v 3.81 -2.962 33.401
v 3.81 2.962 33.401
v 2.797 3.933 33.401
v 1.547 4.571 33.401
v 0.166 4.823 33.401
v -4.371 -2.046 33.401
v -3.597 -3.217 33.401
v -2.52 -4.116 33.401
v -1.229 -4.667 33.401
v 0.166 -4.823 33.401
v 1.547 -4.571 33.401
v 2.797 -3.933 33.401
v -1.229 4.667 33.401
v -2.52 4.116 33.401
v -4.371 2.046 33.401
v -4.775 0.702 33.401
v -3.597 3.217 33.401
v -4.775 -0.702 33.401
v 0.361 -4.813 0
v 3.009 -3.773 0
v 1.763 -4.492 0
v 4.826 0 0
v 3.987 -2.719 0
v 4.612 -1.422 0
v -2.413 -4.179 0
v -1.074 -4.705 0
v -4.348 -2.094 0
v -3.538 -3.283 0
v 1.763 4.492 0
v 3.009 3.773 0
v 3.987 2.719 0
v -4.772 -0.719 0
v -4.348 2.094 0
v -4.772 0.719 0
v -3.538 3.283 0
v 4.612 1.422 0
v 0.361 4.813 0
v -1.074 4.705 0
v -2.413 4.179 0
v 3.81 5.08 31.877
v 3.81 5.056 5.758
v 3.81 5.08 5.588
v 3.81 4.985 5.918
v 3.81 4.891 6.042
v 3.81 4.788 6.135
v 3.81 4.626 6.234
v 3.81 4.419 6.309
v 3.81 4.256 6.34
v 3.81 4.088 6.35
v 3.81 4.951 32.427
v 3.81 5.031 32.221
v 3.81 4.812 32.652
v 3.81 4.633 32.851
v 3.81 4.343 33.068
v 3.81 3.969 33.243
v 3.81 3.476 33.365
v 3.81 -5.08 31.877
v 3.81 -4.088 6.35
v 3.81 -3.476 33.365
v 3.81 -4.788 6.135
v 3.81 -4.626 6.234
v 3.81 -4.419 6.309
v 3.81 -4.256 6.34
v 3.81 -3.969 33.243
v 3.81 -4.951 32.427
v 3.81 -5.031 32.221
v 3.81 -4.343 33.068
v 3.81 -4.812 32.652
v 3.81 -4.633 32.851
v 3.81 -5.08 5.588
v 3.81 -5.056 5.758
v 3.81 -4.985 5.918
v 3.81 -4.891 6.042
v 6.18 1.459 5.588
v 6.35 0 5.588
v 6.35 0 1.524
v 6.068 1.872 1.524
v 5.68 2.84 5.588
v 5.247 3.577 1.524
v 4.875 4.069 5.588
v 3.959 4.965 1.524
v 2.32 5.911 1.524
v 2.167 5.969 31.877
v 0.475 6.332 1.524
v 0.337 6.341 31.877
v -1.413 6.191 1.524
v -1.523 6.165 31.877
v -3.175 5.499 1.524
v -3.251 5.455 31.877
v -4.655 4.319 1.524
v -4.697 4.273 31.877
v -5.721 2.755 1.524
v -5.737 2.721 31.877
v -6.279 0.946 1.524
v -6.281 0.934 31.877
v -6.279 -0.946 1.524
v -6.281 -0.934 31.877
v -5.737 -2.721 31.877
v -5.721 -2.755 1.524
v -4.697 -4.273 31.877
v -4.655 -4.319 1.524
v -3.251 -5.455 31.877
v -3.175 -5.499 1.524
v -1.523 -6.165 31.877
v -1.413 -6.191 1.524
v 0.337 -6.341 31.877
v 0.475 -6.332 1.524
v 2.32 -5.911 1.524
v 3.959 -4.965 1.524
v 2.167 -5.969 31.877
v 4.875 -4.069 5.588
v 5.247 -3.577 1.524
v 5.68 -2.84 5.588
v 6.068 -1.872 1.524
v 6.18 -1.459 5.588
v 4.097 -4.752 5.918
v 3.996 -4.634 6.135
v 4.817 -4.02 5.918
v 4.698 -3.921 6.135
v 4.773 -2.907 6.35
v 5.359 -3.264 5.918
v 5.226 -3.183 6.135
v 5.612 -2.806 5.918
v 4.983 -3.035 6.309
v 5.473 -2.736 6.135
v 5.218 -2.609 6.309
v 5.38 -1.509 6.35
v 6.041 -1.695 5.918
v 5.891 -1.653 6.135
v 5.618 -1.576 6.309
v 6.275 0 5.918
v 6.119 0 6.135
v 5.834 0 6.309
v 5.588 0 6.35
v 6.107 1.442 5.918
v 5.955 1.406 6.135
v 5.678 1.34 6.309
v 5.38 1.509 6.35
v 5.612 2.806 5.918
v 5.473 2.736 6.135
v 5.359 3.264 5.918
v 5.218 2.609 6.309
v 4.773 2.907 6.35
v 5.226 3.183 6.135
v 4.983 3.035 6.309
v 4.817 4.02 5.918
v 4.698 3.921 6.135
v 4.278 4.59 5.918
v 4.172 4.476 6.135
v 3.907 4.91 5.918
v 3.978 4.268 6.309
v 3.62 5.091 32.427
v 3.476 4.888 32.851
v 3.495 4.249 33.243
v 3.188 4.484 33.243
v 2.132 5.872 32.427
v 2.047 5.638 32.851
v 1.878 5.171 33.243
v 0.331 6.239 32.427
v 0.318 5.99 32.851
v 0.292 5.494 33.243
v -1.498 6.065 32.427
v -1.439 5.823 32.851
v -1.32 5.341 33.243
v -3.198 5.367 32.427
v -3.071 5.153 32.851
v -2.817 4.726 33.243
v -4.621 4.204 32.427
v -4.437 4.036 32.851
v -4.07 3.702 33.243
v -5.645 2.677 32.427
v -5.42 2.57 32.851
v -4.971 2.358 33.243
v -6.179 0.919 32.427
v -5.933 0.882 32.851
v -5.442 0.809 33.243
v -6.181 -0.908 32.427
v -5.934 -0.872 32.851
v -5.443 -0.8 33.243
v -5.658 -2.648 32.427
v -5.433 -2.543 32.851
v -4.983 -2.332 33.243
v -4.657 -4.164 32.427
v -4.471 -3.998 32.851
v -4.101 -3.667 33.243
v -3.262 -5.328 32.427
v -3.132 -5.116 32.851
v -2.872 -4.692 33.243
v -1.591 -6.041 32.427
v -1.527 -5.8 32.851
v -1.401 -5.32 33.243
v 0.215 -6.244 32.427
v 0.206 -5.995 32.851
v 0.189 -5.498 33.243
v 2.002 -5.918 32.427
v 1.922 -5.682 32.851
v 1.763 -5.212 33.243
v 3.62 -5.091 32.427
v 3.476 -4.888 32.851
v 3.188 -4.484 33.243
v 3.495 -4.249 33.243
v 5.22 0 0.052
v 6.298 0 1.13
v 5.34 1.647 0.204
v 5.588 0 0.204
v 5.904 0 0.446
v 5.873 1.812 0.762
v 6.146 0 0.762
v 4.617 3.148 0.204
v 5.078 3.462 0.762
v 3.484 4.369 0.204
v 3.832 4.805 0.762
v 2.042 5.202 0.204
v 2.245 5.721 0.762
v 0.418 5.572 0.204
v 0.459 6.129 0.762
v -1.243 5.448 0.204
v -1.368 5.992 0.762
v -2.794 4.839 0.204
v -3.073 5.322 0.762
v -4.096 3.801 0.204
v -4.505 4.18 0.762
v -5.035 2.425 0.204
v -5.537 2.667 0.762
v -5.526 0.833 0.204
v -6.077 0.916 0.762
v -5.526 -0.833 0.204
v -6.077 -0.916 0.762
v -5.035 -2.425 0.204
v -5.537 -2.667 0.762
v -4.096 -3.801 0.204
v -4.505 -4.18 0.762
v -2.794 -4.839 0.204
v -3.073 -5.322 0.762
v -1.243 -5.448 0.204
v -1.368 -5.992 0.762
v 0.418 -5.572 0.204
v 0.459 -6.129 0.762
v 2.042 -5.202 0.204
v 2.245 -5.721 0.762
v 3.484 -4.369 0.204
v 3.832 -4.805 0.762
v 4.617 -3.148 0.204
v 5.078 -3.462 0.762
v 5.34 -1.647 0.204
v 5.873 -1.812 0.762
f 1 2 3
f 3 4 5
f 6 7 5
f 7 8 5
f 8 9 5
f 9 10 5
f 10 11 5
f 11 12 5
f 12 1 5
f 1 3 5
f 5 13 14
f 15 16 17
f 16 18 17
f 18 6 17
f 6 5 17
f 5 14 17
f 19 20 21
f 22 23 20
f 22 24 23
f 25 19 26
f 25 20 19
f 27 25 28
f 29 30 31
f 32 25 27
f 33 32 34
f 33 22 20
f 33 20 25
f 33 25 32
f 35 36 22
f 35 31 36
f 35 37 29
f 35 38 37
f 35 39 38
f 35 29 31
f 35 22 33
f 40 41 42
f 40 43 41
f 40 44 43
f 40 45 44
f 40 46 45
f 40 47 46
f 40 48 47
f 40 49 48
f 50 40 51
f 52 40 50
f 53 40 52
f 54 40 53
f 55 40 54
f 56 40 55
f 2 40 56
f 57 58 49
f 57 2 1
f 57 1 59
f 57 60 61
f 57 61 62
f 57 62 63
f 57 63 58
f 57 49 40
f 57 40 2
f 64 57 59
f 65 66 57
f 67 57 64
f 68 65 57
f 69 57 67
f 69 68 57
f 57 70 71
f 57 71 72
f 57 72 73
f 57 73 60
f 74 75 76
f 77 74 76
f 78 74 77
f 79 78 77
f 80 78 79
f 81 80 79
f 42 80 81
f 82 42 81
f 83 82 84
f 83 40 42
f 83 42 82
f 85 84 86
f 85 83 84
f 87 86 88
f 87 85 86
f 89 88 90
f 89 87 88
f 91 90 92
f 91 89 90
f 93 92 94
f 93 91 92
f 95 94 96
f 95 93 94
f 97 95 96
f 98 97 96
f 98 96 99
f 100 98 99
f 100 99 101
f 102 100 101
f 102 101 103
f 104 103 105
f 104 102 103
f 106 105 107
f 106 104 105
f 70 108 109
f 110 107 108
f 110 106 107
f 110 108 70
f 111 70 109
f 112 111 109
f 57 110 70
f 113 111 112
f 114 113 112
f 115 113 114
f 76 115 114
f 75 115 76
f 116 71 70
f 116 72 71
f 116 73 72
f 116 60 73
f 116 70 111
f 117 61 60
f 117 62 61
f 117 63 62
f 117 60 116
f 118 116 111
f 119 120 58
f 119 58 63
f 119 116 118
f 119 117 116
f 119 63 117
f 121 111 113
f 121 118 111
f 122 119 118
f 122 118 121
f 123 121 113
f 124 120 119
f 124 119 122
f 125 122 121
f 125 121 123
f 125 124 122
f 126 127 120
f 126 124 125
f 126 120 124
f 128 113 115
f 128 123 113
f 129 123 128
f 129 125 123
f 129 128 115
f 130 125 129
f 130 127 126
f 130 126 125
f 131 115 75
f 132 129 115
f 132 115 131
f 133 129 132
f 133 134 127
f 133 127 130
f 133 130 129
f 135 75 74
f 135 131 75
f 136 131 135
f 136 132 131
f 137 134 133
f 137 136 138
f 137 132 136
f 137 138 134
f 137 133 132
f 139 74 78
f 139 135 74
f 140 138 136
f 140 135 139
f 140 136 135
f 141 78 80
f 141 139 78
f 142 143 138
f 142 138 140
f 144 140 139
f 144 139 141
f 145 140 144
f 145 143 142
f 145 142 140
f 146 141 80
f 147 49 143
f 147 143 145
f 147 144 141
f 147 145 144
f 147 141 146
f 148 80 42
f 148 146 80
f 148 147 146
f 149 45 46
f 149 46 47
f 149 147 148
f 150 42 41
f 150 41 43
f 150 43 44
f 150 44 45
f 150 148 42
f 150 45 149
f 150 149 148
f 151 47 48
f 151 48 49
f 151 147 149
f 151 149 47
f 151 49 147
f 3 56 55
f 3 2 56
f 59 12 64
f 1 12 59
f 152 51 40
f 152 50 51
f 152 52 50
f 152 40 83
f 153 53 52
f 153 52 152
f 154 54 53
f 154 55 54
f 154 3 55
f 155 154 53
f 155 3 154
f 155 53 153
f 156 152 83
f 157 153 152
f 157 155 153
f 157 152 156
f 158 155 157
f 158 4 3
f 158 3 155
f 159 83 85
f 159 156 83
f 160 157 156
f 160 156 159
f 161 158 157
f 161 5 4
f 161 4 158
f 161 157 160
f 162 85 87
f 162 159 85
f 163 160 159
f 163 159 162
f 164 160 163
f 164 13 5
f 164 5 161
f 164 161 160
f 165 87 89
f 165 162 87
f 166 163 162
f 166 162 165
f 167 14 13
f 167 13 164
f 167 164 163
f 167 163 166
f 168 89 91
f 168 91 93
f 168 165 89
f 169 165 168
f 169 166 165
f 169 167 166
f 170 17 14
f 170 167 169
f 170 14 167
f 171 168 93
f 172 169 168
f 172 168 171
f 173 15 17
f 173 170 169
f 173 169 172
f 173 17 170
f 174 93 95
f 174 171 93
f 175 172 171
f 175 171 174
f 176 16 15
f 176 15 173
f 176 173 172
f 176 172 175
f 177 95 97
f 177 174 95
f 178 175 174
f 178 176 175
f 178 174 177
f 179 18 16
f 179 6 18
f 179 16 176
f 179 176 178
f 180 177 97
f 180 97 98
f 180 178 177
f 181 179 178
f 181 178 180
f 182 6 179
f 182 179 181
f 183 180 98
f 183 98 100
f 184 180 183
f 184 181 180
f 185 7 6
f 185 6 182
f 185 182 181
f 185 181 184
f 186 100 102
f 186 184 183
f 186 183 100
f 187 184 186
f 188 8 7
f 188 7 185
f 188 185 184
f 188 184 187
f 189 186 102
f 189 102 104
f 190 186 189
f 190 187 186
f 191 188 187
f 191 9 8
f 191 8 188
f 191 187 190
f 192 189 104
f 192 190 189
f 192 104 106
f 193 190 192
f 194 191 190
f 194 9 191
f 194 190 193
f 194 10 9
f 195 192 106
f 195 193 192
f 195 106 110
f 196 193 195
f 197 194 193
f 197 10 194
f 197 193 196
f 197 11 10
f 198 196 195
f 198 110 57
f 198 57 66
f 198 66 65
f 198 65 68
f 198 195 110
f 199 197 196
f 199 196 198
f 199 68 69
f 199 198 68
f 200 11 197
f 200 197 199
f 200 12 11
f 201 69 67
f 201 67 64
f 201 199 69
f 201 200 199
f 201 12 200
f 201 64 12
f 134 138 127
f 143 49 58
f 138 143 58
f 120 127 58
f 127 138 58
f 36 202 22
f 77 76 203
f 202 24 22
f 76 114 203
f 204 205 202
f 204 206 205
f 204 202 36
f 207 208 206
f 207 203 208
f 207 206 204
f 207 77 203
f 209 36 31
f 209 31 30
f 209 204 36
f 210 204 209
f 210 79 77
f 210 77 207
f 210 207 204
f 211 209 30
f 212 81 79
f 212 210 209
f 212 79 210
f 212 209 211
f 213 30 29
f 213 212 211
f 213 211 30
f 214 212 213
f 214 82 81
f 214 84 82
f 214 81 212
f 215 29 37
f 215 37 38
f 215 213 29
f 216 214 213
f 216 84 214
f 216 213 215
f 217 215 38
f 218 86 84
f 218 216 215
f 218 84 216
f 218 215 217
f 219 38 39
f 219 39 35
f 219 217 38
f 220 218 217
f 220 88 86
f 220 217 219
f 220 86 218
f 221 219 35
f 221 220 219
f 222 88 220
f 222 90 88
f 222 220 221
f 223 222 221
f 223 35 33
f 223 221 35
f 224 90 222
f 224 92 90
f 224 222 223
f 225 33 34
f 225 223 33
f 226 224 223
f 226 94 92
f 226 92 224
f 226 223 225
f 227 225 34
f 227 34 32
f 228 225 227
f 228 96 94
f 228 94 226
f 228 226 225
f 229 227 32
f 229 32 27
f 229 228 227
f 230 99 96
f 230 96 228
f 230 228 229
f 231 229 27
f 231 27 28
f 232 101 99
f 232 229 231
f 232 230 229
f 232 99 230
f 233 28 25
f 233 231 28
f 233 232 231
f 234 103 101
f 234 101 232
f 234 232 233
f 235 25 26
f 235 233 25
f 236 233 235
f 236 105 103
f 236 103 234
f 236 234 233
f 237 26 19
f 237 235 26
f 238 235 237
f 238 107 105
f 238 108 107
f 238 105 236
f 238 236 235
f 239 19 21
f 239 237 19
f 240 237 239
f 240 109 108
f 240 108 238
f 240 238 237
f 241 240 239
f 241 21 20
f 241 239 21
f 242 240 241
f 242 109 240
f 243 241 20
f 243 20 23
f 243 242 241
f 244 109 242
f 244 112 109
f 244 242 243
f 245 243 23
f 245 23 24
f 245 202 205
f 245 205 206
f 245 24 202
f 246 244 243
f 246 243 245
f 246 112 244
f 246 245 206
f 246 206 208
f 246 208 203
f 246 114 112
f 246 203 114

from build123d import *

# Parameters (mm, degrees)
F0_W     = 6.35
F0_H     = 33.401
F2_R     = 1.524
F3_W     = 5.08
F3_H     = 28.219457
F4_DEPTH = 12.7
F5_R     = 0.762


with BuildPart() as f1:
    # F0 (on Front) → F1 (revolve)
    with BuildSketch(Plane.XZ):
        with Locations((3.175, 16.7005)):
            Rectangle(F0_W, F0_H)
    revolve(axis=Axis((0, 0, 16.7005), (0, 0, 1)))

    # F2
    f2_edges = [f1.edges().sort_by_distance(p)[0] for p in [
        (-6.35, 0, 0),
        (-6.35, 0, 33.401),
        (6.35, 0, 16.7005),
    ]]
    fillet(f2_edges, radius=F2_R)

    # F3 (on Front) → F4 (cut, symmetric)
    with BuildSketch(Plane.XZ):
        with Locations((6.35, 20.459729)):
            Rectangle(F3_W, F3_H)
    extrude(amount=F4_DEPTH, both=True, mode=Mode.SUBTRACT)

    # F5
    f5_edges = [f1.edges().sort_by_distance(p)[0] for p in [
        (5.679613, 2.839806, 6.35),
        (5.679613, -2.839806, 6.35),
    ]]
    fillet(f5_edges, radius=F5_R)


solid = f1.part
